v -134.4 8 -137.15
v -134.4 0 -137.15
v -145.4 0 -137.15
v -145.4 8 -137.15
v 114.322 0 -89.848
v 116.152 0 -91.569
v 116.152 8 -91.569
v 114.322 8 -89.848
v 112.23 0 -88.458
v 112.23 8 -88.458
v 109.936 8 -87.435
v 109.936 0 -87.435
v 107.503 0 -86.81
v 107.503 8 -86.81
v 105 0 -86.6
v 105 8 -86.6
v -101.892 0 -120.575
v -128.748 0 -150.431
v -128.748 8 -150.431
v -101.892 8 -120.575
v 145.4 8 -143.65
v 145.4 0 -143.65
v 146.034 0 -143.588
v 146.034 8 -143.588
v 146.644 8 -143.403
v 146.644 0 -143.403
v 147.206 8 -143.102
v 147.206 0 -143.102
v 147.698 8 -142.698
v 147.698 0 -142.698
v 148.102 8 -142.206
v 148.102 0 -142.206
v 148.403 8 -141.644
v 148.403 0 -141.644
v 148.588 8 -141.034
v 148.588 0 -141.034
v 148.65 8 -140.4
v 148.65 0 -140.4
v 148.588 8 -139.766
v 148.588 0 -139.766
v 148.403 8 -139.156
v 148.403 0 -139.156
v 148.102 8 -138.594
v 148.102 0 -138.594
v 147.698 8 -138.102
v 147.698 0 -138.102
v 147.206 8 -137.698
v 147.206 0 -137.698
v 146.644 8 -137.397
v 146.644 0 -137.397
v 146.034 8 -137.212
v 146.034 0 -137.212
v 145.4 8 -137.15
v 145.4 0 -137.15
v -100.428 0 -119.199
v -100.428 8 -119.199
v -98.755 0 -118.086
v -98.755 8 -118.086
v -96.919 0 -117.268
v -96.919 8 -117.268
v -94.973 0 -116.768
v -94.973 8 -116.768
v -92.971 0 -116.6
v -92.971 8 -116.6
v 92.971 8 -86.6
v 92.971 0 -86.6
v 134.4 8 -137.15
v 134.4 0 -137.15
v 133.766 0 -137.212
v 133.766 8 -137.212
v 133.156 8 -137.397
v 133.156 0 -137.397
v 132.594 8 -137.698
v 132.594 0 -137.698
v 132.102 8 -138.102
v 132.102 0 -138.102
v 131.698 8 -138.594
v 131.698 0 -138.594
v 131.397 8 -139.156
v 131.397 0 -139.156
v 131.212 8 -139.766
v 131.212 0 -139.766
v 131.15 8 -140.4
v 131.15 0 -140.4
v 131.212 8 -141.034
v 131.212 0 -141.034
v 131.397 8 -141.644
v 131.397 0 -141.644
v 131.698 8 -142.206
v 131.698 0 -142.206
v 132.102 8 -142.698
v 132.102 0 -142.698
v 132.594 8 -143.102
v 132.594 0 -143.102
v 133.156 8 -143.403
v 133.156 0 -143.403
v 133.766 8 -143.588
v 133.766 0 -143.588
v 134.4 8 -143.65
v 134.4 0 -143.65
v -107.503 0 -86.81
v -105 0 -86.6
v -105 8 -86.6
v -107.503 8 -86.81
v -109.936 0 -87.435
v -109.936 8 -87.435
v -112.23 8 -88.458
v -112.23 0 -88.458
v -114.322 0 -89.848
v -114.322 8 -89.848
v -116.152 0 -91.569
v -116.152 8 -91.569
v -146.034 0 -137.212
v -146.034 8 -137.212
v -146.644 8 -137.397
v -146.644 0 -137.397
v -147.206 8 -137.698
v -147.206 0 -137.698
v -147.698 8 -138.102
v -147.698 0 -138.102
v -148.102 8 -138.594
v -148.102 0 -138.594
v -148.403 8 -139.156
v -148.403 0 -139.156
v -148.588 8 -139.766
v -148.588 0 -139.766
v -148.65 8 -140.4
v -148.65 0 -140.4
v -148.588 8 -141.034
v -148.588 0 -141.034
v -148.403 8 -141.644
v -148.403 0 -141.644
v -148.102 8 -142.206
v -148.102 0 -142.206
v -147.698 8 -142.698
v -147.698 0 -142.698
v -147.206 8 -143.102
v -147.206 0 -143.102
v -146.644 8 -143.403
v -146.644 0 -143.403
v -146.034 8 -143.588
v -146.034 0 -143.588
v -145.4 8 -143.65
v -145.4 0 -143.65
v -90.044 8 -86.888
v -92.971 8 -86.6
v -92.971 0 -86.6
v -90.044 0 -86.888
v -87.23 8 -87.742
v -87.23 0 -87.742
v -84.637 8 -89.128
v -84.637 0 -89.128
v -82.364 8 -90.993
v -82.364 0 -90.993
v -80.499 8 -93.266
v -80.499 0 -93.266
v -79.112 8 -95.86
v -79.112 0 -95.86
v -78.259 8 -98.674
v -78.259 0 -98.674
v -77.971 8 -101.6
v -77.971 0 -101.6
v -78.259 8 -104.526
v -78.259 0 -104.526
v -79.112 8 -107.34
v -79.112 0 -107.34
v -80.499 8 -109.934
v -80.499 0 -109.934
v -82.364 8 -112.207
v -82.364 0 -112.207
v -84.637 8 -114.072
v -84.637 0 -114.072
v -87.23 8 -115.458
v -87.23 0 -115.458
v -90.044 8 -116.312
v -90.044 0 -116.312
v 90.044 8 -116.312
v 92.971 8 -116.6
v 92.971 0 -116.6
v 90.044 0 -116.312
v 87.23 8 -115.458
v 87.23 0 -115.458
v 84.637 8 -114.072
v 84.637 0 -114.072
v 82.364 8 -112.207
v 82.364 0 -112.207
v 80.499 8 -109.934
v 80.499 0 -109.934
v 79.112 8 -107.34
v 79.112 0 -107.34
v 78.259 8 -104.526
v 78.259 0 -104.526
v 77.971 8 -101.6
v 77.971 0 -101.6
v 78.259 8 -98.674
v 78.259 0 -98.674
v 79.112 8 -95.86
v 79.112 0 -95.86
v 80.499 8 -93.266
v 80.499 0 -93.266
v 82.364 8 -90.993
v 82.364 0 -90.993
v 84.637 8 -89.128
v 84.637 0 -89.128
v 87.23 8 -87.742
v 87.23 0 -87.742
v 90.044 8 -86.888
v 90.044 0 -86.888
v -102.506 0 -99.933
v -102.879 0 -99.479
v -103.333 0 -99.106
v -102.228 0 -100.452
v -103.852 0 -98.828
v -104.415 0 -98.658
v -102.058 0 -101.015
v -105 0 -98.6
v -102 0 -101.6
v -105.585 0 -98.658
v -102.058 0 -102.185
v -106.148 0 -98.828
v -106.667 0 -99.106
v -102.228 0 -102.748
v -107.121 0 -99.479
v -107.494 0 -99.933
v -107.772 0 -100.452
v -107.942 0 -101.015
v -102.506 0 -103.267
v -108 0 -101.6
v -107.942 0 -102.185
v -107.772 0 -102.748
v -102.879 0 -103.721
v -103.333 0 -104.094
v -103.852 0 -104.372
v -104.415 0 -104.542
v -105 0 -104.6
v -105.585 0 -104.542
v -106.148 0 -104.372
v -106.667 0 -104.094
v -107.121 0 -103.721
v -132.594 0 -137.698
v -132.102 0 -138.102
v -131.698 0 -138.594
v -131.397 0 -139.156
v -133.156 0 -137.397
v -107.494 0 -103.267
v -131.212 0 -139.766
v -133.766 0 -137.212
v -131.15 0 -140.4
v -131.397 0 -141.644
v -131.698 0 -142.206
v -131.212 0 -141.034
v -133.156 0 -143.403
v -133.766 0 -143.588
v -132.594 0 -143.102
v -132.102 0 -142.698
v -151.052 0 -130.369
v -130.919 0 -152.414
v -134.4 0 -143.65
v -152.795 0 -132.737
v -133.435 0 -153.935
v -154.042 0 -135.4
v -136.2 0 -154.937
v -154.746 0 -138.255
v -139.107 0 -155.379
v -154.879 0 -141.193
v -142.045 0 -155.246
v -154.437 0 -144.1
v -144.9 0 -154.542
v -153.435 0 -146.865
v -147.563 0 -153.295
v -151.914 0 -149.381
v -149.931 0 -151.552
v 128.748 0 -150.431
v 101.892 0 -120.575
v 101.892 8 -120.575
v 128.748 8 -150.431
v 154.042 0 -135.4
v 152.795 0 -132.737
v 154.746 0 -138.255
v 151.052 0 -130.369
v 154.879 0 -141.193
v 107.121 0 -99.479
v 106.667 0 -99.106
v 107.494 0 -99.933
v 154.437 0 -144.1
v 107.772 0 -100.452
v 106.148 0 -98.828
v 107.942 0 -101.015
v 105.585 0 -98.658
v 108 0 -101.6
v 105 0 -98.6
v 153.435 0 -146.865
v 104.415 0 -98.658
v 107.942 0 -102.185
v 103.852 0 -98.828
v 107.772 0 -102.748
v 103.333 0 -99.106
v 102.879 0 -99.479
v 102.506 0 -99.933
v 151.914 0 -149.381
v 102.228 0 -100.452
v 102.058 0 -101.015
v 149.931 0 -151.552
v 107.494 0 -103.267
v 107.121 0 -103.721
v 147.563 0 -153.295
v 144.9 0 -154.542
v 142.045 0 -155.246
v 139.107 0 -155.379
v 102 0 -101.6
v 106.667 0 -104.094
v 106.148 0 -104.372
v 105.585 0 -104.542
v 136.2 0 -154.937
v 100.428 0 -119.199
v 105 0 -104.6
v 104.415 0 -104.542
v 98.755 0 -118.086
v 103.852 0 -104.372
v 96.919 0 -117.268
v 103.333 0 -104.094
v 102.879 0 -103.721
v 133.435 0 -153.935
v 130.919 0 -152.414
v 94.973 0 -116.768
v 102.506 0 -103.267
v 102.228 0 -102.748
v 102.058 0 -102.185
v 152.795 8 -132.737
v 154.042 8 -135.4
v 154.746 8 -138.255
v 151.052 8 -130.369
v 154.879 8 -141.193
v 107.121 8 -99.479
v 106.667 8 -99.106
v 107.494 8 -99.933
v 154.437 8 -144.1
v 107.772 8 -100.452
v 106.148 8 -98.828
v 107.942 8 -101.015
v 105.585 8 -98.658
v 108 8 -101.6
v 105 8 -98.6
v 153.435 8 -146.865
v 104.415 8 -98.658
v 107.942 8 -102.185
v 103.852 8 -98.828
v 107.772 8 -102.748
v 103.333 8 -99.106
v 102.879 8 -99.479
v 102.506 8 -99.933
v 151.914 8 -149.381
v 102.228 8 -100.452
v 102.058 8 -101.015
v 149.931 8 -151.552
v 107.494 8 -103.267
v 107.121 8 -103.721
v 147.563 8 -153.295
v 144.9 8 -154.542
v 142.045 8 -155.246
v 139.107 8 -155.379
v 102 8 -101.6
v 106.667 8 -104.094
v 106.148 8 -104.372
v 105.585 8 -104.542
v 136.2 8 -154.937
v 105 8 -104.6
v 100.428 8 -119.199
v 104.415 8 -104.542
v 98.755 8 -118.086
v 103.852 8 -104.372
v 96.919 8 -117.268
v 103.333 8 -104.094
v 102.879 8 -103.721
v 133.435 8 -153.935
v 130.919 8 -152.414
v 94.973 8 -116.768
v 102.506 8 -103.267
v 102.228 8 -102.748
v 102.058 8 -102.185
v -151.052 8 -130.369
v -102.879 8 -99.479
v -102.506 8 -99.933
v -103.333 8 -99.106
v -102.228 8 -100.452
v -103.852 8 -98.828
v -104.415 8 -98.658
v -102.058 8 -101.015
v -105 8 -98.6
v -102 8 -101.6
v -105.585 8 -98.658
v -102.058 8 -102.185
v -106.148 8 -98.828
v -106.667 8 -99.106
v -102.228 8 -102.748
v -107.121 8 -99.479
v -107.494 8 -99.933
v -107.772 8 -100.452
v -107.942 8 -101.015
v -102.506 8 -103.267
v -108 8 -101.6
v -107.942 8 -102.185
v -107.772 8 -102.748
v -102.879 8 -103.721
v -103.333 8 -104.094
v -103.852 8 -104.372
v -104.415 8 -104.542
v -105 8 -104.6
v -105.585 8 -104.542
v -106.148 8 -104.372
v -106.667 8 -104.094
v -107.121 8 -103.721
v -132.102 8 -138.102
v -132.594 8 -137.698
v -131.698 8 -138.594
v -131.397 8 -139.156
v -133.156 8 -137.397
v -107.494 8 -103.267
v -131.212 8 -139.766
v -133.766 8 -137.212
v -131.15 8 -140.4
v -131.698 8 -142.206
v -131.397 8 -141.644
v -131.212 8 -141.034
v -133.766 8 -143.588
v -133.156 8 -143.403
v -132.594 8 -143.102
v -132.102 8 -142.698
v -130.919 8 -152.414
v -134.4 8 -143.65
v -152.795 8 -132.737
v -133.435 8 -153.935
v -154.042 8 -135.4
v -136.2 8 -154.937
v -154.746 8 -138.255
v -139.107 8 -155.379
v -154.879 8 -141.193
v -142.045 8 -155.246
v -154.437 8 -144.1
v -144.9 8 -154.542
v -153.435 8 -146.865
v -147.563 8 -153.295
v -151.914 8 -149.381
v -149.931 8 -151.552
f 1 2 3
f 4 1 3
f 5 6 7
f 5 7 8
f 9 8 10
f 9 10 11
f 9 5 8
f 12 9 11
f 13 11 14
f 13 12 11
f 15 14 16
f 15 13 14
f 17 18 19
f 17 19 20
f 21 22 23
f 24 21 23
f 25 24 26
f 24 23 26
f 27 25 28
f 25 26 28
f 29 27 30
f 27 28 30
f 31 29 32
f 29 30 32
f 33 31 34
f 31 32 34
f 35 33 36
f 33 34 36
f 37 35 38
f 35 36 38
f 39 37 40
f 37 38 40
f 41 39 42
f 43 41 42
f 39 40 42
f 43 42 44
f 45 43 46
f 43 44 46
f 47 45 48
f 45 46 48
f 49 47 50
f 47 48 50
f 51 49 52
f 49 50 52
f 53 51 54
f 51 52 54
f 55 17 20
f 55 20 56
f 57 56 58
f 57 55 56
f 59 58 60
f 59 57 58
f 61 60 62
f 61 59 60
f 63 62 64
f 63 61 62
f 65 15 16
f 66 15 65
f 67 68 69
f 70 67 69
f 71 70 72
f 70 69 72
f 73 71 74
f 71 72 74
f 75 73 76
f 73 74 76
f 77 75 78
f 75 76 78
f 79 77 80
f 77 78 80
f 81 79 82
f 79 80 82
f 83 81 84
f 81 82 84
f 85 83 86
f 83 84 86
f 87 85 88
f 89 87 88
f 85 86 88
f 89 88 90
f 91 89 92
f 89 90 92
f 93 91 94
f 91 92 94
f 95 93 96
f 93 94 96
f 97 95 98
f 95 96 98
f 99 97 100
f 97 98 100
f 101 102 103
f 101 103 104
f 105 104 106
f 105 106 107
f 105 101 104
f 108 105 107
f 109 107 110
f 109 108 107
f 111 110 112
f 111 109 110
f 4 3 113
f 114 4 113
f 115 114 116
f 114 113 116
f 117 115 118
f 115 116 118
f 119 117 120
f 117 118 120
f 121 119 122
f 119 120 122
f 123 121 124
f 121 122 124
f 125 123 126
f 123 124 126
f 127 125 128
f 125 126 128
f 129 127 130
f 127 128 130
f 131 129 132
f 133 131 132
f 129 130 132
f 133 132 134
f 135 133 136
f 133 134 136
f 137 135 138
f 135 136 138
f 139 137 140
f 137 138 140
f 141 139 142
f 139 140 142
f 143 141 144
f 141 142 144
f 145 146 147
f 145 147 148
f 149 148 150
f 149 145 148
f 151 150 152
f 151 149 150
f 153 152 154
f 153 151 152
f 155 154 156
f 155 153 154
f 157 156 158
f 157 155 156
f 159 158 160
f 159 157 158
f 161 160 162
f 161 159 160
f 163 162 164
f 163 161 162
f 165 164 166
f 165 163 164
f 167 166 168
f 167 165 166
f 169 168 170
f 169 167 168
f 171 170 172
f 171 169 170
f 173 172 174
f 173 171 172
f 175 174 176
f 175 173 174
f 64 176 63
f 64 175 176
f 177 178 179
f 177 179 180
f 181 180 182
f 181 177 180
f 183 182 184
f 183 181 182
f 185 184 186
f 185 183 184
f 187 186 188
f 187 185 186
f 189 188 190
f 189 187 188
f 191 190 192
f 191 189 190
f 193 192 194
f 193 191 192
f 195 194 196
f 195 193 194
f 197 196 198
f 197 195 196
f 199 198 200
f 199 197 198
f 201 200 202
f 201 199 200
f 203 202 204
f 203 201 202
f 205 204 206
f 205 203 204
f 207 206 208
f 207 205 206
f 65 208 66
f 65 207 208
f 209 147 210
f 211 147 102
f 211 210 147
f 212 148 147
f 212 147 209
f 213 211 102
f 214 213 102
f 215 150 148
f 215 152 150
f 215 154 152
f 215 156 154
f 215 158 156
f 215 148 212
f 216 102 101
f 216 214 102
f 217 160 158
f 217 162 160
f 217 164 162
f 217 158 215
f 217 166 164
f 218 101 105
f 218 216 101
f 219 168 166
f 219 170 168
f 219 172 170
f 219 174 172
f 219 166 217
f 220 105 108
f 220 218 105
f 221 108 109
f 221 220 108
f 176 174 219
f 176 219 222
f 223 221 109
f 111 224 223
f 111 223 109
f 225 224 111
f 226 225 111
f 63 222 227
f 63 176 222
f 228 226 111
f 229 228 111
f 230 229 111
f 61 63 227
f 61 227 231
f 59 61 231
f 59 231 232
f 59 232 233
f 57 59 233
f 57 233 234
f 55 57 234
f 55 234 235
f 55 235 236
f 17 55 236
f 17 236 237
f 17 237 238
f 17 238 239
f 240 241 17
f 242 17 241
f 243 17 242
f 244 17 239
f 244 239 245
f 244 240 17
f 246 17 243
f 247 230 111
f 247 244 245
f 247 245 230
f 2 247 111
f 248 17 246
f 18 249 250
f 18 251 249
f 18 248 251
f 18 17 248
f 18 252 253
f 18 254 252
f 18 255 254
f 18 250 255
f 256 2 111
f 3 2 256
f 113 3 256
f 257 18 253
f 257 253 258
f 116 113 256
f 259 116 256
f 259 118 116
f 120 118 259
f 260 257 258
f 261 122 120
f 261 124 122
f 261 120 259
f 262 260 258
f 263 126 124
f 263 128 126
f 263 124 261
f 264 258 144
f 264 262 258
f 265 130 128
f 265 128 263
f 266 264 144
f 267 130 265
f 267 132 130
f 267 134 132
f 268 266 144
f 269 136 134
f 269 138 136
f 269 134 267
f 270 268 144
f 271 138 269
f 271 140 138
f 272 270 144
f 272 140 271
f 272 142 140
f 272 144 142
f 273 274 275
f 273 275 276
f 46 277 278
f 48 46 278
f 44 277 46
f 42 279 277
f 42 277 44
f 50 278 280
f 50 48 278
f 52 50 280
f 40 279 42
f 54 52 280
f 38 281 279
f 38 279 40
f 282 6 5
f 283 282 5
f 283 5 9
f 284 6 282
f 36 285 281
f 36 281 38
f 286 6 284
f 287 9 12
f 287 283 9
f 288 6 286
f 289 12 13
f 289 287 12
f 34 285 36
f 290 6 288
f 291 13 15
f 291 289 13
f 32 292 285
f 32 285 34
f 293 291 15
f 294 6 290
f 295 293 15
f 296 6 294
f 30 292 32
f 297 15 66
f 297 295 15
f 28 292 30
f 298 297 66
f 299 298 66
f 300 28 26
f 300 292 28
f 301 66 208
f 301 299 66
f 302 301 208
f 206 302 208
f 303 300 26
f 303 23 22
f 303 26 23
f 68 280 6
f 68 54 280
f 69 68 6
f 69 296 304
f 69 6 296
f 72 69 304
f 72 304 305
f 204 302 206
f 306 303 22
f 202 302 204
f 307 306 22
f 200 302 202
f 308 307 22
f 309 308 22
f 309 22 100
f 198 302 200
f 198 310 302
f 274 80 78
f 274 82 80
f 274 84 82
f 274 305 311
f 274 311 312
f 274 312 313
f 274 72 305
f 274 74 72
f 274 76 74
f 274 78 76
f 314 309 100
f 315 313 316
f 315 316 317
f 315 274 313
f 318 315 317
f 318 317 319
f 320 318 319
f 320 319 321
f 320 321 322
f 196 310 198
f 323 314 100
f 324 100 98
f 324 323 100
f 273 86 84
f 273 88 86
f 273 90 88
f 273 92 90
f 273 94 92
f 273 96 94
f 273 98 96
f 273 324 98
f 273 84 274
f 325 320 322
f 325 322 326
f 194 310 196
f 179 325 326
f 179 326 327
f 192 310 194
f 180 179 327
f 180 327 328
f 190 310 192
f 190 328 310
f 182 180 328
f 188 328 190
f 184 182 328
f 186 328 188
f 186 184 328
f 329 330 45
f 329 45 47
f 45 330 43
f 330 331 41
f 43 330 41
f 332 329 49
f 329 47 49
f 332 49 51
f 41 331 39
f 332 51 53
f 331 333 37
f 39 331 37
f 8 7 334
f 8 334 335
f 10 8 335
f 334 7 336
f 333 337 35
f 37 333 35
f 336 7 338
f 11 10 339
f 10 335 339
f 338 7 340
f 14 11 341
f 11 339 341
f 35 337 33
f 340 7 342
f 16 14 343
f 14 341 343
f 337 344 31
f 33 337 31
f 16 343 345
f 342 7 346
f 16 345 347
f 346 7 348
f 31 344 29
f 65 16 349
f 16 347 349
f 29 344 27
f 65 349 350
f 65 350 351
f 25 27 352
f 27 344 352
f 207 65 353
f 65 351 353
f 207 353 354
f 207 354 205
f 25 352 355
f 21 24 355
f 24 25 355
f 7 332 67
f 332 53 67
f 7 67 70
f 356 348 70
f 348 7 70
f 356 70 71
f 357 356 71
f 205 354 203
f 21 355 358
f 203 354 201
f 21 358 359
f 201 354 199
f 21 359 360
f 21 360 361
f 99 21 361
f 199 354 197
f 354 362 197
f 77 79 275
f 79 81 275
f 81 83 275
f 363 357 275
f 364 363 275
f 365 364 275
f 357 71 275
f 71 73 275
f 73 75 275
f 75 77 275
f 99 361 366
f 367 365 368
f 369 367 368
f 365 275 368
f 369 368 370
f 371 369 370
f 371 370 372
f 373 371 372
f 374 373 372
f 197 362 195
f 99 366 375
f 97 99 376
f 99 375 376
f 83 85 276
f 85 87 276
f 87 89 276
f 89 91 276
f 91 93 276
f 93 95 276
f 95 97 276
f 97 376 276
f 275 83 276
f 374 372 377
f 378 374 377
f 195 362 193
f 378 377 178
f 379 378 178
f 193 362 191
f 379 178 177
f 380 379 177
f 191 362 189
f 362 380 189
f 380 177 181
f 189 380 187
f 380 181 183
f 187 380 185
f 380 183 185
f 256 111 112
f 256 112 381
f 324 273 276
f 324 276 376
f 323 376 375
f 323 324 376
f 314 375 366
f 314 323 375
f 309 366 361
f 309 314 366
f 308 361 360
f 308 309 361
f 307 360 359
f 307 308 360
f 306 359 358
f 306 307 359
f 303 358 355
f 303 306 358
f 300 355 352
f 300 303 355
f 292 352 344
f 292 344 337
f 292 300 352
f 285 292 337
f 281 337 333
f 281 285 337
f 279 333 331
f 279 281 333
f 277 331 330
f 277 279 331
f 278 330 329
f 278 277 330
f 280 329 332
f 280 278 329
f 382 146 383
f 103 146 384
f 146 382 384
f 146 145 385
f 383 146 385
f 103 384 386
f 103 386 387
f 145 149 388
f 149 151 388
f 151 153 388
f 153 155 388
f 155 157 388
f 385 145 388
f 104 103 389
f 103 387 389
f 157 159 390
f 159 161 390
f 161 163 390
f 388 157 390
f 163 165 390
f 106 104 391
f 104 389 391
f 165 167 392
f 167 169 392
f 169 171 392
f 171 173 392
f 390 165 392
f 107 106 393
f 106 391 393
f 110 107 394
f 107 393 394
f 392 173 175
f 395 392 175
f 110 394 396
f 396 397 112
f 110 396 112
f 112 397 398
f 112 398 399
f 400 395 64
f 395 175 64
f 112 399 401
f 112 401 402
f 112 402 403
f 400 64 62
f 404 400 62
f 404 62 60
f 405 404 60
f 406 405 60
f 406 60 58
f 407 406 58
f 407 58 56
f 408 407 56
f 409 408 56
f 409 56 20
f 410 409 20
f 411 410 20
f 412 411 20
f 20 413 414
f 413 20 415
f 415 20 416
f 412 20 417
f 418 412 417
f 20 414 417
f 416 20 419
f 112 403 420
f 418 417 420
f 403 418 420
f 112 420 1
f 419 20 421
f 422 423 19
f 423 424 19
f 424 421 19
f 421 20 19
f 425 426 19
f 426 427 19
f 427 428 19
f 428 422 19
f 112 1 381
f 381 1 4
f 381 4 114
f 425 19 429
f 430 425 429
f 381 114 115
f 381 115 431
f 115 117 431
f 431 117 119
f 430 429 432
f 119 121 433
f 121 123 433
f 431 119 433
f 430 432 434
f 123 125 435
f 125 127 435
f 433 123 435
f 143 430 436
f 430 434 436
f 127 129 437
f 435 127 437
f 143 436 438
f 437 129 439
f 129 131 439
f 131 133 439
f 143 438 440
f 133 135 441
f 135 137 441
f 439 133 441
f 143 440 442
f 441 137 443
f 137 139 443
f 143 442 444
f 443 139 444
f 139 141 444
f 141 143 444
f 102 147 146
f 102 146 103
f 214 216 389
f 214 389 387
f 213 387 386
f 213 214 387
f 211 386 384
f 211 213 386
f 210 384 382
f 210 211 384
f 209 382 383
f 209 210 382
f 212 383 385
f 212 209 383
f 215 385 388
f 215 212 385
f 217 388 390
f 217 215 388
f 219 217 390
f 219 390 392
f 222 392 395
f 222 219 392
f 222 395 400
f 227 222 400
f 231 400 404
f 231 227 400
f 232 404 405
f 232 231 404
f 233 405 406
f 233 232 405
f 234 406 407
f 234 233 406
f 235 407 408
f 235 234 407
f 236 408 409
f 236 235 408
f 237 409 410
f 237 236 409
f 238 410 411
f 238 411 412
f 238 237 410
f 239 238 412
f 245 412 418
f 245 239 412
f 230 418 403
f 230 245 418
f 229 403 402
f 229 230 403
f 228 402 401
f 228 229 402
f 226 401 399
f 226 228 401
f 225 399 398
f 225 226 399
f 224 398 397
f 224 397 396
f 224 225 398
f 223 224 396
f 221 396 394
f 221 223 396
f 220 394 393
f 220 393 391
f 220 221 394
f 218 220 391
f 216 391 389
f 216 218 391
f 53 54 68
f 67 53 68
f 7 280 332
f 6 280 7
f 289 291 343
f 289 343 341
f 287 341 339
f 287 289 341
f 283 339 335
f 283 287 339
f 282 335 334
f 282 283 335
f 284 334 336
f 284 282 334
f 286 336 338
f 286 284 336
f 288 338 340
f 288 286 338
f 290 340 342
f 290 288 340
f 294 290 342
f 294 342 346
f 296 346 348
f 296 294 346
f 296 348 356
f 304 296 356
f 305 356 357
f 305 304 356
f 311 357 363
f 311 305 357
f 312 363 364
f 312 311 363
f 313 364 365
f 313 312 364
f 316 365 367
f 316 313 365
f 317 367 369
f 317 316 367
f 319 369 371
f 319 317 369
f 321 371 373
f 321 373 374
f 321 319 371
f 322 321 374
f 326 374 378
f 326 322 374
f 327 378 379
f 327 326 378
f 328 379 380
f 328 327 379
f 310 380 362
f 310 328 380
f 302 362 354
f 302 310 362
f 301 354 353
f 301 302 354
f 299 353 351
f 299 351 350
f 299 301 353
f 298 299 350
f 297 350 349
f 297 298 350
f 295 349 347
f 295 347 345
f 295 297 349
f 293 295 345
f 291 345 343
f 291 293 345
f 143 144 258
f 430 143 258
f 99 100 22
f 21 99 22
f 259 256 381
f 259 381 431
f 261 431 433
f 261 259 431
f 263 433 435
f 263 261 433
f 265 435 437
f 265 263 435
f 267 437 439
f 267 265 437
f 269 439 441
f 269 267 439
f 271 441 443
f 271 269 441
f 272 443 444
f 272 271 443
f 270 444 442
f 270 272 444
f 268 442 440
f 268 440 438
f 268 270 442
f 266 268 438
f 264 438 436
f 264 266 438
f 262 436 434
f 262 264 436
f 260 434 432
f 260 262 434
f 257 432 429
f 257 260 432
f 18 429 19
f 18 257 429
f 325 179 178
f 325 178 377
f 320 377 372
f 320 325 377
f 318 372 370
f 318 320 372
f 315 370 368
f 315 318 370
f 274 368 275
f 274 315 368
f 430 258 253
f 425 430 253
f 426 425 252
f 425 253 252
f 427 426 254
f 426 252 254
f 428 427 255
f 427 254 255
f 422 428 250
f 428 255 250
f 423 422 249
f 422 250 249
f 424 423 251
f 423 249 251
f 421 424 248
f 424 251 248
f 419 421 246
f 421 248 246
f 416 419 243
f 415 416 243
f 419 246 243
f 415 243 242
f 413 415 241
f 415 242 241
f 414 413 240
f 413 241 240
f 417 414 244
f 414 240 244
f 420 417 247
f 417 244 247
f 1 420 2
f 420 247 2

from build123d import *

# Parameters (mm, degrees)
SKETCH1_R           = 3
BOSS_EXTRUDE1_DEPTH = 8
CUT_EXTRUDE1_DEPTH  = 220.561312621


with BuildPart() as part:
    # Sketch1 → Boss-Extrude1 (new body)
    with BuildSketch(Plane(origin=(0, 0, 0), x_dir=(1, 0, 0), z_dir=(0, 1, 0))):
        with BuildLine():
            Line((-128.747729842, 150.431294549), (-101.892422534, 120.574964361))
            ThreePointArc((-101.892422534, 120.574964361), (-97.854230693, 117.638694702), (-92.970606408, 116.6))
            Line((-92.970606408, 116.6), (92.970606408, 116.6))
            ThreePointArc((92.970606408, 116.6), (97.854230693, 117.638694702), (101.892422534, 120.574964361))
            Line((101.892422534, 120.574964361), (128.747729842, 150.431294549))
            ThreePointArc((128.747729842, 150.431294549), (149.931294549, 151.552270158), (151.052270158, 130.368705451))
            Line((151.052270158, 130.368705451), (116.152270158, 91.568705451))
            ThreePointArc((116.152270158, 91.568705451), (111.104530357, 87.898368378), (105, 86.6))
            Line((105, 86.6), (-105, 86.6))
            ThreePointArc((-105, 86.6), (-111.104530357, 87.898368378), (-116.152270158, 91.568705451))
            Line((-116.152270158, 91.568705451), (-151.052270158, 130.368705451))
            ThreePointArc((-151.052270158, 130.368705451), (-149.931294549, 151.552270158), (-128.747729842, 150.431294549))
        make_face()
        with Locations(Location((-105, 101.6, 0), (0, 0, 270))):
            Circle(SKETCH1_R, mode=Mode.SUBTRACT)
        with Locations(Location((105, 101.6, 0), (0, 0, 270))):
            Circle(SKETCH1_R, mode=Mode.SUBTRACT)
        with BuildLine():
            Line((-145.4, 143.65), (-134.4, 143.65))
            ThreePointArc((-134.4, 143.65), (-131.15, 140.4), (-134.4, 137.15))
            Line((-134.4, 137.15), (-145.4, 137.15))
            ThreePointArc((-145.4, 137.15), (-148.65, 140.4), (-145.4, 143.65))
        make_face(mode=Mode.SUBTRACT)
        with BuildLine():
            Line((145.4, 137.15), (134.4, 137.15))
            ThreePointArc((134.4, 137.15), (131.15, 140.4), (134.4, 143.65))
            Line((134.4, 143.65), (145.4, 143.65))
            ThreePointArc((145.4, 143.65), (148.65, 140.4), (145.4, 137.15))
        make_face(mode=Mode.SUBTRACT)
    extrude(amount=BOSS_EXTRUDE1_DEPTH)

    # Sketch3 → Cut-Extrude1 (cut, through all)
    with BuildSketch(Plane(origin=(0, 8, 0), x_dir=(1, 0, 0), z_dir=(0, 1, 0))):
        with BuildLine():
            Line((-92.970606408, 116.6), (92.970606408, 116.6))
            ThreePointArc((92.970606408, 116.6), (77.970606408, 101.6), (92.970606408, 86.6))
            Line((92.970606408, 86.6), (-92.970606408, 86.6))
            ThreePointArc((-92.970606408, 86.6), (-77.970606408, 101.6), (-92.970606408, 116.6))
        make_face()
    extrude(amount=-CUT_EXTRUDE1_DEPTH, mode=Mode.SUBTRACT)


with BuildPart() as cut_extrude1_piece_1:
    # of the separate pieces the step leaves, piece 1, a body of its own (cut_extrude1_pieces)
    add(part.part.solids().sort_by_distance((92.970606408, 0, -116.6))[0])


with BuildPart() as cut_extrude1_piece_2:
    # of the separate pieces the step leaves, piece 2, a body of its own (cut_extrude1_pieces)
    add(part.part.solids().sort_by_distance((-128.747729842, 0, -150.431294549))[0])


solid = Compound([cut_extrude1_piece_1.part, cut_extrude1_piece_2.part])
